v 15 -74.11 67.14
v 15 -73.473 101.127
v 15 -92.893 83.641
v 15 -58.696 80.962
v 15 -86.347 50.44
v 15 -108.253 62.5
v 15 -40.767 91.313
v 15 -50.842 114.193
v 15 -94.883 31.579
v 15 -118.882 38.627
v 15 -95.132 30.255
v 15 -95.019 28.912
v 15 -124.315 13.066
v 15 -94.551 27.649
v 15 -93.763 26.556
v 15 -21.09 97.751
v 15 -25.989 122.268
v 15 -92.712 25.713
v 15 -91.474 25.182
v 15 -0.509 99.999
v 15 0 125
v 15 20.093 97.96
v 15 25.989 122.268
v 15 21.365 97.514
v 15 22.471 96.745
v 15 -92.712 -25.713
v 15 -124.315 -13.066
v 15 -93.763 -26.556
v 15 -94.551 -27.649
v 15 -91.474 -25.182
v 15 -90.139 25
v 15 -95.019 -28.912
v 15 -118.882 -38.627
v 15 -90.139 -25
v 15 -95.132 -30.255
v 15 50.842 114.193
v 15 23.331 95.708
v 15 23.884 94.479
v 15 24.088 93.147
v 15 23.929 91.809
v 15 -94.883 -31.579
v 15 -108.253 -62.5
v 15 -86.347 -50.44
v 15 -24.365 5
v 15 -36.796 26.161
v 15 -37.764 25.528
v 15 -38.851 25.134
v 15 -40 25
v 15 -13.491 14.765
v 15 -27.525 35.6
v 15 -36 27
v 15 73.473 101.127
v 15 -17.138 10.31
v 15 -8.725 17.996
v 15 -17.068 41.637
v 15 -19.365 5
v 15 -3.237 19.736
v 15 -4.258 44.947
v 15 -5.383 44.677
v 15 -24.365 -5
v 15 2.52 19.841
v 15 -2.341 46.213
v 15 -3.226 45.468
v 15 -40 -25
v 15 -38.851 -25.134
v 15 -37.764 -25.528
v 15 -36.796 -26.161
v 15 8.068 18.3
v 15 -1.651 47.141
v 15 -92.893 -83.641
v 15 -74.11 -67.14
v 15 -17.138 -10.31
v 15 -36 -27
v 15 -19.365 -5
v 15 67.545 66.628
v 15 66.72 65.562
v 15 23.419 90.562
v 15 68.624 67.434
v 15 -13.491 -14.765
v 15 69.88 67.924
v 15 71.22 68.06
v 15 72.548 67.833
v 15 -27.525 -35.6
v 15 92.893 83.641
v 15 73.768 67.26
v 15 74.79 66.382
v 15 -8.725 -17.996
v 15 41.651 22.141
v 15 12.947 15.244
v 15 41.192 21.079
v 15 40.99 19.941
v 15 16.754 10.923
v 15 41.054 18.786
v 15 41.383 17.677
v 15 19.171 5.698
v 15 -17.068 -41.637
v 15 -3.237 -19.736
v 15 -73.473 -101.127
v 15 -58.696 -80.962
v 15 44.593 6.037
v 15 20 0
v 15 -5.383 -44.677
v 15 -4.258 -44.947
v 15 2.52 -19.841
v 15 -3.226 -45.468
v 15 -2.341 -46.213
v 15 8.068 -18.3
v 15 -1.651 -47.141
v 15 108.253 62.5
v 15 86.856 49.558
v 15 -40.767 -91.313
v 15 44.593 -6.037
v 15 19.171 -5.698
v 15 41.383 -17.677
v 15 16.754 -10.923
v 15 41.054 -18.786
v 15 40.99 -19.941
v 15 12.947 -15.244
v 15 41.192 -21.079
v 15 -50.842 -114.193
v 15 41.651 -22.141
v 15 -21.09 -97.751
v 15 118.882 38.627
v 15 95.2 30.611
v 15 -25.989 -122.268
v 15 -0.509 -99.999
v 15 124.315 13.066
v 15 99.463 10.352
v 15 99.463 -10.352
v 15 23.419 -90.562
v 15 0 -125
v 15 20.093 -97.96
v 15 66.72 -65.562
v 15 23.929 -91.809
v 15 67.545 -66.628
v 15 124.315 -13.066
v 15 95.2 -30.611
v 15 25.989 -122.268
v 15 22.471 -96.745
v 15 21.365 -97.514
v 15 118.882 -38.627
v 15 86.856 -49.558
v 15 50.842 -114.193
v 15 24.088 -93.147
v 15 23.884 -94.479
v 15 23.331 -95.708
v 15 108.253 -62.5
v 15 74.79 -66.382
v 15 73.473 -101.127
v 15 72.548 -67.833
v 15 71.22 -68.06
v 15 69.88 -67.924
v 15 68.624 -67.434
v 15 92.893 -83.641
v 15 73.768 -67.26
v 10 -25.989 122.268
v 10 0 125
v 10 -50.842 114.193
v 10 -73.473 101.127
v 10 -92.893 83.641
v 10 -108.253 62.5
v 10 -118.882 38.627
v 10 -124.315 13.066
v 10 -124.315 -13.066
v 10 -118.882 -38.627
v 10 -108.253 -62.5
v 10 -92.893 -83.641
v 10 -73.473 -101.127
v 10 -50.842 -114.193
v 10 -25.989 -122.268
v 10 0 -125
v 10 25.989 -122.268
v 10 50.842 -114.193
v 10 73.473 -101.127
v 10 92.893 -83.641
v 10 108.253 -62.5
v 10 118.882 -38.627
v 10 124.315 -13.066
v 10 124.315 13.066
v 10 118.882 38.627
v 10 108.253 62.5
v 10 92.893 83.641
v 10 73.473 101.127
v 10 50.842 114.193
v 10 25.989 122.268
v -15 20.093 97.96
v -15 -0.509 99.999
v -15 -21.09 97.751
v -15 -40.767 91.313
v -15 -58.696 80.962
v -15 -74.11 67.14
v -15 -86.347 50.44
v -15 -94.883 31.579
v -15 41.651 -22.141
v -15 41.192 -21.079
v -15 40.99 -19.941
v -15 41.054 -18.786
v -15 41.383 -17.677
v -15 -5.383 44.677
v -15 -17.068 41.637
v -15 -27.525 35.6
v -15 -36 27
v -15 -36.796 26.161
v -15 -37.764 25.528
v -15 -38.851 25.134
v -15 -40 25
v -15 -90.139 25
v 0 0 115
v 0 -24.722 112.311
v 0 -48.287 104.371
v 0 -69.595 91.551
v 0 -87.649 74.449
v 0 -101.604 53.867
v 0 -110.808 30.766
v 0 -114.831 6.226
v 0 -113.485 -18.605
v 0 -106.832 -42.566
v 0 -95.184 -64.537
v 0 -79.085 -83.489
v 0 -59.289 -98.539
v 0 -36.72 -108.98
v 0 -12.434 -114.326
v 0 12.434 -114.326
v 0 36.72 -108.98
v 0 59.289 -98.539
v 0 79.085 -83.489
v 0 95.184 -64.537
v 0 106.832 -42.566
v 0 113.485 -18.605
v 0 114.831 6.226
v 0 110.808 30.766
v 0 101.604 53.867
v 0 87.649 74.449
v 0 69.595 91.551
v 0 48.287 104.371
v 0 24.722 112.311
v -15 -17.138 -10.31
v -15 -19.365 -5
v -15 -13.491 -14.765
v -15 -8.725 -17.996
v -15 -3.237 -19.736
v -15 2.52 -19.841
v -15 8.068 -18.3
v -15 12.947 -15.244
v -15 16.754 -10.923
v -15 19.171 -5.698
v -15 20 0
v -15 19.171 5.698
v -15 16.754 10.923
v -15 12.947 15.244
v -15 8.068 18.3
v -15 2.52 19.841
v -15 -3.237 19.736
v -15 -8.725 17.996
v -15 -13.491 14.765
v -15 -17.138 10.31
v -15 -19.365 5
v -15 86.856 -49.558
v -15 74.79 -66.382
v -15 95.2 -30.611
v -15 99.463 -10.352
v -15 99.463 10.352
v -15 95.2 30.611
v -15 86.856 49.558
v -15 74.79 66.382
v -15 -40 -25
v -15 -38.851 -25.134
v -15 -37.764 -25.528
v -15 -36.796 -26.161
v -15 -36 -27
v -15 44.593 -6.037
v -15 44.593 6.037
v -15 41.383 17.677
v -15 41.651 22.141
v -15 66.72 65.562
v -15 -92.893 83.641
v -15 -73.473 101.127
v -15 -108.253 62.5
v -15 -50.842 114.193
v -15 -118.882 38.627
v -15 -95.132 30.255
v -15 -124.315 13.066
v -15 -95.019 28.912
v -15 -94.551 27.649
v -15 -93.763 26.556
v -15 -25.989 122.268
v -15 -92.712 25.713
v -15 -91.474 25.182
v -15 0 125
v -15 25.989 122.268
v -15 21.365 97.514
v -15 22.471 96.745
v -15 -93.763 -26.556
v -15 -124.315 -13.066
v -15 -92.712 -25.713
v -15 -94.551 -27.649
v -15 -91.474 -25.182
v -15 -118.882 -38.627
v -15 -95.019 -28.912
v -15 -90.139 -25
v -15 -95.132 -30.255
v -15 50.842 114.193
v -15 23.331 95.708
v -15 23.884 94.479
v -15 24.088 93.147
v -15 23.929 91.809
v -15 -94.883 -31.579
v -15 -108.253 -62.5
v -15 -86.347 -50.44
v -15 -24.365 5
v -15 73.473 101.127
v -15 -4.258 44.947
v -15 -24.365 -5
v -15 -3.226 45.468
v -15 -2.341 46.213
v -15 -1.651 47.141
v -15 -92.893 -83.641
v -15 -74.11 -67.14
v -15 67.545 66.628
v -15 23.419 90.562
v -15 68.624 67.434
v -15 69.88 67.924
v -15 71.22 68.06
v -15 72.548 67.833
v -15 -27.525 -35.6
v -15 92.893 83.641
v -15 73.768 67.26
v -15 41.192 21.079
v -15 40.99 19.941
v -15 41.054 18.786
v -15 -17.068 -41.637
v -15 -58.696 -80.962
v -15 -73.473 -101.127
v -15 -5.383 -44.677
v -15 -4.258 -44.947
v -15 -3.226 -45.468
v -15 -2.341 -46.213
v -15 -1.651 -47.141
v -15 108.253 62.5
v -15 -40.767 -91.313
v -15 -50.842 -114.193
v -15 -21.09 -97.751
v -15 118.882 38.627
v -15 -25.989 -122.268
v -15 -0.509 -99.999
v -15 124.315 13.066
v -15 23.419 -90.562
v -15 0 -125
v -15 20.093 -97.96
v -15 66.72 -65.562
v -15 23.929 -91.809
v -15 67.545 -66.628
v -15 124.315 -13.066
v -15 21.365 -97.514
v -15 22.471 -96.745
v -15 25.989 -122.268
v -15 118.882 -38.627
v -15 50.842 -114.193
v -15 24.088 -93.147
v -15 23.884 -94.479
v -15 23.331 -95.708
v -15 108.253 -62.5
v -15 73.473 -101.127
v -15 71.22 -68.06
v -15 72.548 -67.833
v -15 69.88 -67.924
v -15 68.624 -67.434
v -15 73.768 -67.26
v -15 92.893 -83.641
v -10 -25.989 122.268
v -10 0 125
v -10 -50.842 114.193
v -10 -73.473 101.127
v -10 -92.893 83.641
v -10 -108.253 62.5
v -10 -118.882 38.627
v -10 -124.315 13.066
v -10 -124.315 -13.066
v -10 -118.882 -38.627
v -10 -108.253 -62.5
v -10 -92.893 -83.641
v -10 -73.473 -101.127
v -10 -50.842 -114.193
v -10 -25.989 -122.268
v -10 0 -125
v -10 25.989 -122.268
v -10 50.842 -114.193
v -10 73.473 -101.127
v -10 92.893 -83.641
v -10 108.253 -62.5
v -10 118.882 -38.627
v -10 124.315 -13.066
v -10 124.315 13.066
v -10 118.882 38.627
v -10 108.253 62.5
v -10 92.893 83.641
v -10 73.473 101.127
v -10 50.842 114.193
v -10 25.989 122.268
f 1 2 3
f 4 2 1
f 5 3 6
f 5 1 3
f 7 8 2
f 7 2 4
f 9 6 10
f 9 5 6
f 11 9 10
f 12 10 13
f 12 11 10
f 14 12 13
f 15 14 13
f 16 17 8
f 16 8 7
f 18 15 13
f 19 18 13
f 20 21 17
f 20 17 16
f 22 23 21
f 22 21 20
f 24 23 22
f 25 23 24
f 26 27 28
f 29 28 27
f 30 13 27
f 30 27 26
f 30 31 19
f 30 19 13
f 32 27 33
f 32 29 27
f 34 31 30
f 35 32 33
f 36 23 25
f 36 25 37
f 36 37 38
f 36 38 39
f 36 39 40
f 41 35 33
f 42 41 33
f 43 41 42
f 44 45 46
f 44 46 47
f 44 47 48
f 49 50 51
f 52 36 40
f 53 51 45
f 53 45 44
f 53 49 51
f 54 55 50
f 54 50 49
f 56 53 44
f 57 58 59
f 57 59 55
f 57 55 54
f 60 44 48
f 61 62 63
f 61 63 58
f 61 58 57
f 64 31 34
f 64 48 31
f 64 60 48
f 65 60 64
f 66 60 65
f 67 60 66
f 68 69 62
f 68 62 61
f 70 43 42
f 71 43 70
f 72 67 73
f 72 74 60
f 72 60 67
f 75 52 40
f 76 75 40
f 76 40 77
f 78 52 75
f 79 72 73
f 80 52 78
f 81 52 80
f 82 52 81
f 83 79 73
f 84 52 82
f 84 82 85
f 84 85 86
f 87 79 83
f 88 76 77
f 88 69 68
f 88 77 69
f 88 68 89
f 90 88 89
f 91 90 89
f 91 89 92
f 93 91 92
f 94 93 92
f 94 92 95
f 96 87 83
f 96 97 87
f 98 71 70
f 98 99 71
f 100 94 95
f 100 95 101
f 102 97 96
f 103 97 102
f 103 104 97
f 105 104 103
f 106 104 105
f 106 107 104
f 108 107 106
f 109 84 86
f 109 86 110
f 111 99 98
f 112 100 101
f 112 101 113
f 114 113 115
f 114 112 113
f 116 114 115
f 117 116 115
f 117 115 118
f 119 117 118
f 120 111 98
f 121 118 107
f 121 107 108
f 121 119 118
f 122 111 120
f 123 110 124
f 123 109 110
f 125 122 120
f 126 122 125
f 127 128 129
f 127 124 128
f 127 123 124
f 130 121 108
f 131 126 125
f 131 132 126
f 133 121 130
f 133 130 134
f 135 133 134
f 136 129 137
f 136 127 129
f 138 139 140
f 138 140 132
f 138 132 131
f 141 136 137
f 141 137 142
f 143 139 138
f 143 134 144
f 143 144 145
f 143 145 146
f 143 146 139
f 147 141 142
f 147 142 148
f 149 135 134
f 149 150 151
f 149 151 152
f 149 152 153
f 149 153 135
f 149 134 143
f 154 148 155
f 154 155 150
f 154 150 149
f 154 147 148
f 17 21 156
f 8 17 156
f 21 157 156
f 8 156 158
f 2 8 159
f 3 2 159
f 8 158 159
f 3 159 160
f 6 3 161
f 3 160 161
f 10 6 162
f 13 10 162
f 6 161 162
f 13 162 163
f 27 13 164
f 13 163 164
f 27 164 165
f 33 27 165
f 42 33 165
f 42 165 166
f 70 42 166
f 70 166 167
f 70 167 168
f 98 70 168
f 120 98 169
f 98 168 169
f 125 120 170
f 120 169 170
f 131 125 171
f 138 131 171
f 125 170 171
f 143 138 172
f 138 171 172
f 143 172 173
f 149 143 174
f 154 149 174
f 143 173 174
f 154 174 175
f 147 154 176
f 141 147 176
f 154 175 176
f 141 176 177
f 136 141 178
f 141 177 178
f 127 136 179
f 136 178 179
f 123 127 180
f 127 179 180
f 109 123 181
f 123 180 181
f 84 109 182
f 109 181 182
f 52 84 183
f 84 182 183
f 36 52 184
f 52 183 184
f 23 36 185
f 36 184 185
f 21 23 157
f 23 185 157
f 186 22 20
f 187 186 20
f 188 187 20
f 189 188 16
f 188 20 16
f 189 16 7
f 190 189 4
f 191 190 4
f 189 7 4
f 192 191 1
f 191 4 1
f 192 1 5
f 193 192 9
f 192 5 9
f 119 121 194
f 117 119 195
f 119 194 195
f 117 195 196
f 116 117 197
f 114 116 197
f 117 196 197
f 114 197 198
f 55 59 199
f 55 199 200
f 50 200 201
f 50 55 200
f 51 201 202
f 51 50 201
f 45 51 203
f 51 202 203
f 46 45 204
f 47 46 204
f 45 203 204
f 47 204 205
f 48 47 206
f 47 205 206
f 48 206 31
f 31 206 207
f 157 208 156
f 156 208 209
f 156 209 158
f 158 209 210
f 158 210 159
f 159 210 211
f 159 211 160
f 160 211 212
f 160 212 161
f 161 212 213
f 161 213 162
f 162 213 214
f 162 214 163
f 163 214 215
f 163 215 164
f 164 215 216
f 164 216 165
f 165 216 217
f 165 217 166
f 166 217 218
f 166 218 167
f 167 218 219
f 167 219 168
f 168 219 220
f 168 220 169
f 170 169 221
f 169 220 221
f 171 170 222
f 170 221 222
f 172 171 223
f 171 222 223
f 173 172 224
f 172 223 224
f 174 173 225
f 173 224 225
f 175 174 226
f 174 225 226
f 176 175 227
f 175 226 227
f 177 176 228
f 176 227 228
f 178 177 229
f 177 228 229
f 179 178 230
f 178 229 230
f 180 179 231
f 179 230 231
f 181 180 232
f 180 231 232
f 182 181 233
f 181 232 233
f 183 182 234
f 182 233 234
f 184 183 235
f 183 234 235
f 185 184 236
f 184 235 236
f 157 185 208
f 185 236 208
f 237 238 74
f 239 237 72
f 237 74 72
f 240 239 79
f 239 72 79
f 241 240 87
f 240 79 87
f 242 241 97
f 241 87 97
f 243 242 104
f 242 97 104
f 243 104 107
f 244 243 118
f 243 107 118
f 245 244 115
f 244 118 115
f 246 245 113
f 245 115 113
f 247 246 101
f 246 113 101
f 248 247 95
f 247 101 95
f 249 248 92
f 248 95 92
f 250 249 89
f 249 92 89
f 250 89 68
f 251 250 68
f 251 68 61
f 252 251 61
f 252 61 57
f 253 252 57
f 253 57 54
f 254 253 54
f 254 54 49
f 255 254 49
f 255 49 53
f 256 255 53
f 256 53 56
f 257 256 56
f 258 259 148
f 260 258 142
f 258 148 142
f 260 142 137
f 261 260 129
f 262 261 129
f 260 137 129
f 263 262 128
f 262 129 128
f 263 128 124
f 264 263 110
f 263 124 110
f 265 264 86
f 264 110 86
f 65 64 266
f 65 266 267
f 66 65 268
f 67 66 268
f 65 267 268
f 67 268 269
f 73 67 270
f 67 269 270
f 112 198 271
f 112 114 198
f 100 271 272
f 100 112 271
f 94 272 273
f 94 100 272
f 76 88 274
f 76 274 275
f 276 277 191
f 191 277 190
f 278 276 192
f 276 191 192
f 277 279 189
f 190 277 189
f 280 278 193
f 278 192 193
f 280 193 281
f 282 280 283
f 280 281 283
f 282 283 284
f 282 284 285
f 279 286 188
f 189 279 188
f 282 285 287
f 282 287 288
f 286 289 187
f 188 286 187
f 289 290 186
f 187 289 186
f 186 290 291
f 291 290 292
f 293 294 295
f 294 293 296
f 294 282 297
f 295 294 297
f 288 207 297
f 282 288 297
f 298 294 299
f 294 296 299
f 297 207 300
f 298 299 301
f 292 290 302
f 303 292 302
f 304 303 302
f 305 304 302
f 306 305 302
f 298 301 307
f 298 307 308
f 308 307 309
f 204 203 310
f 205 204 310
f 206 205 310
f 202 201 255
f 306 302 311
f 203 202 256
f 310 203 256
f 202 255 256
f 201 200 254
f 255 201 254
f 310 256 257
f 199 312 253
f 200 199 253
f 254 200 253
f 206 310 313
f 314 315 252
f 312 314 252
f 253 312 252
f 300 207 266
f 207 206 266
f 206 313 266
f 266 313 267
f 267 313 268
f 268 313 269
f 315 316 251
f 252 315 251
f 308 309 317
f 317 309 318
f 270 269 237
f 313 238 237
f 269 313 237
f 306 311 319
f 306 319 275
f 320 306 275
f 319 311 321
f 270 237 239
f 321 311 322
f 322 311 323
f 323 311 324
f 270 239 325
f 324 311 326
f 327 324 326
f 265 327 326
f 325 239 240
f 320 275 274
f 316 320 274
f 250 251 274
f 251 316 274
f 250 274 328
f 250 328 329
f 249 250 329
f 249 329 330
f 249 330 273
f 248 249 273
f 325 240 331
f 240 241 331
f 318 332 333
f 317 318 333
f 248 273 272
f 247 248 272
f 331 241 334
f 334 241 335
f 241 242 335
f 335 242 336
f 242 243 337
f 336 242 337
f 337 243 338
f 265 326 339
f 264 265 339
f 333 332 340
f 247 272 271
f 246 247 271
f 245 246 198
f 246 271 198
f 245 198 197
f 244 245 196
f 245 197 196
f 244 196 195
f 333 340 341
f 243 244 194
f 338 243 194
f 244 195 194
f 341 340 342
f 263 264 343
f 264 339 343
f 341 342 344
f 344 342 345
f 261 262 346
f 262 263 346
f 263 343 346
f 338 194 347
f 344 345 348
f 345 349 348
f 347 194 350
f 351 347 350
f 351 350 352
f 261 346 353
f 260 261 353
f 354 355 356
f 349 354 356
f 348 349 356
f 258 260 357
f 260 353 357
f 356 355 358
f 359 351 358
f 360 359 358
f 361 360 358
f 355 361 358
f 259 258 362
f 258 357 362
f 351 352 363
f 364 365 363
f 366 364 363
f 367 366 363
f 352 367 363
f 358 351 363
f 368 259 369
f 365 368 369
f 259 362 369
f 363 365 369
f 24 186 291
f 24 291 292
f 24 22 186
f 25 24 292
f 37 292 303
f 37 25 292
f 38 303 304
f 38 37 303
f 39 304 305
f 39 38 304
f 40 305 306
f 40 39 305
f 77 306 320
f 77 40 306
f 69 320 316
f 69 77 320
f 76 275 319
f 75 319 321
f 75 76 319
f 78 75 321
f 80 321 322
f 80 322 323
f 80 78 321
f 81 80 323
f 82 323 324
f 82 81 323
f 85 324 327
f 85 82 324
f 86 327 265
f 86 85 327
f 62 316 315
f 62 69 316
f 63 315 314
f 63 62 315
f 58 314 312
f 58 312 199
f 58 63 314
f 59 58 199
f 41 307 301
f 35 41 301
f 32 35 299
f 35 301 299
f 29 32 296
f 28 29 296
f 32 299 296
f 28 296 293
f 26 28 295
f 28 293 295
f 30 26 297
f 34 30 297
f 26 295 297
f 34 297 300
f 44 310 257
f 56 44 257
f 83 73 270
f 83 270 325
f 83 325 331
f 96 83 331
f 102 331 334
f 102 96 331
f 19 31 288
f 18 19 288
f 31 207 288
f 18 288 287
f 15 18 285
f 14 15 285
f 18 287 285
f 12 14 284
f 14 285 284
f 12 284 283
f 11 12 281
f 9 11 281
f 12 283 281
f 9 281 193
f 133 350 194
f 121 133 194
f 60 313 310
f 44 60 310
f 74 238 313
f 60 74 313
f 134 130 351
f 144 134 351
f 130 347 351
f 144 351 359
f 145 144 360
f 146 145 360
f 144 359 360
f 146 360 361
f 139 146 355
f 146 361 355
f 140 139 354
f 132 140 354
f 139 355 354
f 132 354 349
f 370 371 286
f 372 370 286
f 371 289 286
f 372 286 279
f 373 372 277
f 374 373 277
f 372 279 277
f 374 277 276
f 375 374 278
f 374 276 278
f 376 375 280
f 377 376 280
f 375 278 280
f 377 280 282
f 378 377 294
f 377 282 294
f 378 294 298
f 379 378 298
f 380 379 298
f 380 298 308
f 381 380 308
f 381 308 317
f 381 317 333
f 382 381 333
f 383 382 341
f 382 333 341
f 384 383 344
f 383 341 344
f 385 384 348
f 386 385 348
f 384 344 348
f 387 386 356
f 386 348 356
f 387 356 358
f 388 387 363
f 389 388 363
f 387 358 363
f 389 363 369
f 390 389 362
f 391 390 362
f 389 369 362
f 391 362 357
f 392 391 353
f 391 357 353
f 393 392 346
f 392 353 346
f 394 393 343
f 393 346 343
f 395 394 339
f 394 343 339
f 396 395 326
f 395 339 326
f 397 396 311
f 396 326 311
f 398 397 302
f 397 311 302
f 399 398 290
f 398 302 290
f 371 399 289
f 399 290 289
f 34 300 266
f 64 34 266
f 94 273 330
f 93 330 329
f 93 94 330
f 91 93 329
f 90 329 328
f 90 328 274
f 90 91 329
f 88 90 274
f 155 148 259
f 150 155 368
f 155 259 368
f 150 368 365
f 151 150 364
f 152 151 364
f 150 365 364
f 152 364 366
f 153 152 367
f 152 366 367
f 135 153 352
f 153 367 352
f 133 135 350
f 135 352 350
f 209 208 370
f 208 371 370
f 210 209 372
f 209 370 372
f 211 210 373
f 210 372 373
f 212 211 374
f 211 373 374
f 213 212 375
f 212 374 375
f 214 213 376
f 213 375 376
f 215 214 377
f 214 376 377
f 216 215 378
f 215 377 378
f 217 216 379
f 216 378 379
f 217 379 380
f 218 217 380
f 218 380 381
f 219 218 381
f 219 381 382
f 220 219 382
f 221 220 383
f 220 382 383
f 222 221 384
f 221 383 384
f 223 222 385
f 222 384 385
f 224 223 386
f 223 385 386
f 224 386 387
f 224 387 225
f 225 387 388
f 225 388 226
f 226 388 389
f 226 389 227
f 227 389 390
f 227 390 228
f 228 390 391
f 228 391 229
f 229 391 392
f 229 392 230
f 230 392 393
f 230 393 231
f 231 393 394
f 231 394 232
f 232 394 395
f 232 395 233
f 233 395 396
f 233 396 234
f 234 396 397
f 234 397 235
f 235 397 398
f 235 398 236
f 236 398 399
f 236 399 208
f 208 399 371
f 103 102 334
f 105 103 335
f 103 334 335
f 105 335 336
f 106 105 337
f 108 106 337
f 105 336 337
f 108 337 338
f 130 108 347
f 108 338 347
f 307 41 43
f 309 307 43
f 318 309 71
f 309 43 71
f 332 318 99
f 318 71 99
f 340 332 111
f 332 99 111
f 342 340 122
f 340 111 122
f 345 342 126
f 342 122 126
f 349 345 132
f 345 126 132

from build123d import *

# Parameters (mm, degrees)
SKETCH1_W           = 30
SKETCH1_H           = 25
BOSS_EXTRUDE1_DEPTH = 15
CUT_EXTRUDE1_DEPTH  = 180.30421077


with BuildPart() as part:
    # Sketch1 → Revolve1 (revolve)
    with BuildSketch(Plane(origin=(0, 0, 0), x_dir=(1, 0, 0), z_dir=(0, 1, 0)), mode=Mode.PRIVATE) as revolve1_sk:
        Polygon((-15, 125), (-15, 100), (15, 100), (15, 125), (10, 125), (0, 115), (-10, 125), align=None)
        with Locations((0, 32.5)):
            Rectangle(SKETCH1_W, SKETCH1_H)
    revolve(revolve1_sk.sketch.rotate(Axis((0, 0, 0), (1, 0, 0)), 180), axis=Axis((0, 0, 0), (1, 0, 0)))

    # Sketch2 → Boss-Extrude1 (add, symmetric)
    with BuildSketch(Plane(origin=(0, 0, 0), x_dir=(0, 0, -1), z_dir=(1, 0, 0))):
        with BuildLine():
            Line((25, -90.138781887), (25, -40))
            ThreePointArc((25, -40), (25.527864045, -37.763932023), (27, -36))
            ThreePointArc((27, -36), (0, -45), (-27, -36))
            ThreePointArc((-27, -36), (-25.527864045, -37.763932023), (-25, -40))
            Line((-25, -40), (-25, -90.138781887))
            ThreePointArc((-25, -90.138781887), (-27.075511741, -94.194317415), (-31.578947368, -94.882928302))
            ThreePointArc((-31.578947368, -94.882928302), (0, -100), (31.578947368, -94.882928302))
            ThreePointArc((31.578947368, -94.882928302), (27.075511741, -94.194317415), (25, -90.138781887))
        make_face()
        with BuildLine():
            ThreePointArc((17.676914536, 41.382685902), (38.97114317, 22.5), (44.676914536, -5.382685902))
            ThreePointArc((44.676914536, -5.382685902), (45.468456501, -3.225812756), (47.141016151, -1.650635095))
            Line((47.141016151, -1.650635095), (90.56247498, 23.418755849))
            ThreePointArc((90.56247498, 23.418755849), (95.112427644, 23.64907772), (97.960499979, 20.093293505))
            ThreePointArc((97.960499979, 20.093293505), (86.602540378, 50), (66.381552611, 74.789634797))
            ThreePointArc((66.381552611, 74.789634797), (68.036915903, 70.545239695), (65.56247498, 66.720026038))
            Line((65.56247498, 66.720026038), (22.141016151, 41.650635095))
            ThreePointArc((22.141016151, 41.650635095), (19.940592456, 40.989744779), (17.676914536, 41.382685902))
        make_face()
        with BuildLine():
            ThreePointArc((-47.141016151, -1.650635095), (-45.468456501, -3.225812756), (-44.676914536, -5.382685902))
            ThreePointArc((-44.676914536, -5.382685902), (-38.97114317, 22.5), (-17.676914536, 41.382685902))
            ThreePointArc((-17.676914536, 41.382685902), (-19.940592456, 40.989744779), (-22.141016151, 41.650635095))
            Line((-22.141016151, 41.650635095), (-65.56247498, 66.720026038))
            ThreePointArc((-65.56247498, 66.720026038), (-68.036915903, 70.545239695), (-66.381552611, 74.789634797))
            ThreePointArc((-66.381552611, 74.789634797), (-86.602540378, 50), (-97.960499979, 20.093293505))
            ThreePointArc((-97.960499979, 20.093293505), (-95.112427644, 23.64907772), (-90.56247498, 23.418755849))
            Line((-90.56247498, 23.418755849), (-47.141016151, -1.650635095))
        make_face()
    extrude(amount=BOSS_EXTRUDE1_DEPTH, both=True)

    # Sketch4 → Cut-Extrude1 (cut, through all)
    with BuildSketch(Plane.ZY.offset(15)):
        with BuildLine():
            Line((5, -24.364916731), (5, -19.364916731))
            ThreePointArc((5, -19.364916731), (0, -20), (-5, -19.364916731))
            Line((-5, -19.364916731), (-5, -24.364916731))
            Line((-5, -24.364916731), (5, -24.364916731))
        make_face()
    extrude(amount=-CUT_EXTRUDE1_DEPTH, mode=Mode.SUBTRACT)


solid = part.part
